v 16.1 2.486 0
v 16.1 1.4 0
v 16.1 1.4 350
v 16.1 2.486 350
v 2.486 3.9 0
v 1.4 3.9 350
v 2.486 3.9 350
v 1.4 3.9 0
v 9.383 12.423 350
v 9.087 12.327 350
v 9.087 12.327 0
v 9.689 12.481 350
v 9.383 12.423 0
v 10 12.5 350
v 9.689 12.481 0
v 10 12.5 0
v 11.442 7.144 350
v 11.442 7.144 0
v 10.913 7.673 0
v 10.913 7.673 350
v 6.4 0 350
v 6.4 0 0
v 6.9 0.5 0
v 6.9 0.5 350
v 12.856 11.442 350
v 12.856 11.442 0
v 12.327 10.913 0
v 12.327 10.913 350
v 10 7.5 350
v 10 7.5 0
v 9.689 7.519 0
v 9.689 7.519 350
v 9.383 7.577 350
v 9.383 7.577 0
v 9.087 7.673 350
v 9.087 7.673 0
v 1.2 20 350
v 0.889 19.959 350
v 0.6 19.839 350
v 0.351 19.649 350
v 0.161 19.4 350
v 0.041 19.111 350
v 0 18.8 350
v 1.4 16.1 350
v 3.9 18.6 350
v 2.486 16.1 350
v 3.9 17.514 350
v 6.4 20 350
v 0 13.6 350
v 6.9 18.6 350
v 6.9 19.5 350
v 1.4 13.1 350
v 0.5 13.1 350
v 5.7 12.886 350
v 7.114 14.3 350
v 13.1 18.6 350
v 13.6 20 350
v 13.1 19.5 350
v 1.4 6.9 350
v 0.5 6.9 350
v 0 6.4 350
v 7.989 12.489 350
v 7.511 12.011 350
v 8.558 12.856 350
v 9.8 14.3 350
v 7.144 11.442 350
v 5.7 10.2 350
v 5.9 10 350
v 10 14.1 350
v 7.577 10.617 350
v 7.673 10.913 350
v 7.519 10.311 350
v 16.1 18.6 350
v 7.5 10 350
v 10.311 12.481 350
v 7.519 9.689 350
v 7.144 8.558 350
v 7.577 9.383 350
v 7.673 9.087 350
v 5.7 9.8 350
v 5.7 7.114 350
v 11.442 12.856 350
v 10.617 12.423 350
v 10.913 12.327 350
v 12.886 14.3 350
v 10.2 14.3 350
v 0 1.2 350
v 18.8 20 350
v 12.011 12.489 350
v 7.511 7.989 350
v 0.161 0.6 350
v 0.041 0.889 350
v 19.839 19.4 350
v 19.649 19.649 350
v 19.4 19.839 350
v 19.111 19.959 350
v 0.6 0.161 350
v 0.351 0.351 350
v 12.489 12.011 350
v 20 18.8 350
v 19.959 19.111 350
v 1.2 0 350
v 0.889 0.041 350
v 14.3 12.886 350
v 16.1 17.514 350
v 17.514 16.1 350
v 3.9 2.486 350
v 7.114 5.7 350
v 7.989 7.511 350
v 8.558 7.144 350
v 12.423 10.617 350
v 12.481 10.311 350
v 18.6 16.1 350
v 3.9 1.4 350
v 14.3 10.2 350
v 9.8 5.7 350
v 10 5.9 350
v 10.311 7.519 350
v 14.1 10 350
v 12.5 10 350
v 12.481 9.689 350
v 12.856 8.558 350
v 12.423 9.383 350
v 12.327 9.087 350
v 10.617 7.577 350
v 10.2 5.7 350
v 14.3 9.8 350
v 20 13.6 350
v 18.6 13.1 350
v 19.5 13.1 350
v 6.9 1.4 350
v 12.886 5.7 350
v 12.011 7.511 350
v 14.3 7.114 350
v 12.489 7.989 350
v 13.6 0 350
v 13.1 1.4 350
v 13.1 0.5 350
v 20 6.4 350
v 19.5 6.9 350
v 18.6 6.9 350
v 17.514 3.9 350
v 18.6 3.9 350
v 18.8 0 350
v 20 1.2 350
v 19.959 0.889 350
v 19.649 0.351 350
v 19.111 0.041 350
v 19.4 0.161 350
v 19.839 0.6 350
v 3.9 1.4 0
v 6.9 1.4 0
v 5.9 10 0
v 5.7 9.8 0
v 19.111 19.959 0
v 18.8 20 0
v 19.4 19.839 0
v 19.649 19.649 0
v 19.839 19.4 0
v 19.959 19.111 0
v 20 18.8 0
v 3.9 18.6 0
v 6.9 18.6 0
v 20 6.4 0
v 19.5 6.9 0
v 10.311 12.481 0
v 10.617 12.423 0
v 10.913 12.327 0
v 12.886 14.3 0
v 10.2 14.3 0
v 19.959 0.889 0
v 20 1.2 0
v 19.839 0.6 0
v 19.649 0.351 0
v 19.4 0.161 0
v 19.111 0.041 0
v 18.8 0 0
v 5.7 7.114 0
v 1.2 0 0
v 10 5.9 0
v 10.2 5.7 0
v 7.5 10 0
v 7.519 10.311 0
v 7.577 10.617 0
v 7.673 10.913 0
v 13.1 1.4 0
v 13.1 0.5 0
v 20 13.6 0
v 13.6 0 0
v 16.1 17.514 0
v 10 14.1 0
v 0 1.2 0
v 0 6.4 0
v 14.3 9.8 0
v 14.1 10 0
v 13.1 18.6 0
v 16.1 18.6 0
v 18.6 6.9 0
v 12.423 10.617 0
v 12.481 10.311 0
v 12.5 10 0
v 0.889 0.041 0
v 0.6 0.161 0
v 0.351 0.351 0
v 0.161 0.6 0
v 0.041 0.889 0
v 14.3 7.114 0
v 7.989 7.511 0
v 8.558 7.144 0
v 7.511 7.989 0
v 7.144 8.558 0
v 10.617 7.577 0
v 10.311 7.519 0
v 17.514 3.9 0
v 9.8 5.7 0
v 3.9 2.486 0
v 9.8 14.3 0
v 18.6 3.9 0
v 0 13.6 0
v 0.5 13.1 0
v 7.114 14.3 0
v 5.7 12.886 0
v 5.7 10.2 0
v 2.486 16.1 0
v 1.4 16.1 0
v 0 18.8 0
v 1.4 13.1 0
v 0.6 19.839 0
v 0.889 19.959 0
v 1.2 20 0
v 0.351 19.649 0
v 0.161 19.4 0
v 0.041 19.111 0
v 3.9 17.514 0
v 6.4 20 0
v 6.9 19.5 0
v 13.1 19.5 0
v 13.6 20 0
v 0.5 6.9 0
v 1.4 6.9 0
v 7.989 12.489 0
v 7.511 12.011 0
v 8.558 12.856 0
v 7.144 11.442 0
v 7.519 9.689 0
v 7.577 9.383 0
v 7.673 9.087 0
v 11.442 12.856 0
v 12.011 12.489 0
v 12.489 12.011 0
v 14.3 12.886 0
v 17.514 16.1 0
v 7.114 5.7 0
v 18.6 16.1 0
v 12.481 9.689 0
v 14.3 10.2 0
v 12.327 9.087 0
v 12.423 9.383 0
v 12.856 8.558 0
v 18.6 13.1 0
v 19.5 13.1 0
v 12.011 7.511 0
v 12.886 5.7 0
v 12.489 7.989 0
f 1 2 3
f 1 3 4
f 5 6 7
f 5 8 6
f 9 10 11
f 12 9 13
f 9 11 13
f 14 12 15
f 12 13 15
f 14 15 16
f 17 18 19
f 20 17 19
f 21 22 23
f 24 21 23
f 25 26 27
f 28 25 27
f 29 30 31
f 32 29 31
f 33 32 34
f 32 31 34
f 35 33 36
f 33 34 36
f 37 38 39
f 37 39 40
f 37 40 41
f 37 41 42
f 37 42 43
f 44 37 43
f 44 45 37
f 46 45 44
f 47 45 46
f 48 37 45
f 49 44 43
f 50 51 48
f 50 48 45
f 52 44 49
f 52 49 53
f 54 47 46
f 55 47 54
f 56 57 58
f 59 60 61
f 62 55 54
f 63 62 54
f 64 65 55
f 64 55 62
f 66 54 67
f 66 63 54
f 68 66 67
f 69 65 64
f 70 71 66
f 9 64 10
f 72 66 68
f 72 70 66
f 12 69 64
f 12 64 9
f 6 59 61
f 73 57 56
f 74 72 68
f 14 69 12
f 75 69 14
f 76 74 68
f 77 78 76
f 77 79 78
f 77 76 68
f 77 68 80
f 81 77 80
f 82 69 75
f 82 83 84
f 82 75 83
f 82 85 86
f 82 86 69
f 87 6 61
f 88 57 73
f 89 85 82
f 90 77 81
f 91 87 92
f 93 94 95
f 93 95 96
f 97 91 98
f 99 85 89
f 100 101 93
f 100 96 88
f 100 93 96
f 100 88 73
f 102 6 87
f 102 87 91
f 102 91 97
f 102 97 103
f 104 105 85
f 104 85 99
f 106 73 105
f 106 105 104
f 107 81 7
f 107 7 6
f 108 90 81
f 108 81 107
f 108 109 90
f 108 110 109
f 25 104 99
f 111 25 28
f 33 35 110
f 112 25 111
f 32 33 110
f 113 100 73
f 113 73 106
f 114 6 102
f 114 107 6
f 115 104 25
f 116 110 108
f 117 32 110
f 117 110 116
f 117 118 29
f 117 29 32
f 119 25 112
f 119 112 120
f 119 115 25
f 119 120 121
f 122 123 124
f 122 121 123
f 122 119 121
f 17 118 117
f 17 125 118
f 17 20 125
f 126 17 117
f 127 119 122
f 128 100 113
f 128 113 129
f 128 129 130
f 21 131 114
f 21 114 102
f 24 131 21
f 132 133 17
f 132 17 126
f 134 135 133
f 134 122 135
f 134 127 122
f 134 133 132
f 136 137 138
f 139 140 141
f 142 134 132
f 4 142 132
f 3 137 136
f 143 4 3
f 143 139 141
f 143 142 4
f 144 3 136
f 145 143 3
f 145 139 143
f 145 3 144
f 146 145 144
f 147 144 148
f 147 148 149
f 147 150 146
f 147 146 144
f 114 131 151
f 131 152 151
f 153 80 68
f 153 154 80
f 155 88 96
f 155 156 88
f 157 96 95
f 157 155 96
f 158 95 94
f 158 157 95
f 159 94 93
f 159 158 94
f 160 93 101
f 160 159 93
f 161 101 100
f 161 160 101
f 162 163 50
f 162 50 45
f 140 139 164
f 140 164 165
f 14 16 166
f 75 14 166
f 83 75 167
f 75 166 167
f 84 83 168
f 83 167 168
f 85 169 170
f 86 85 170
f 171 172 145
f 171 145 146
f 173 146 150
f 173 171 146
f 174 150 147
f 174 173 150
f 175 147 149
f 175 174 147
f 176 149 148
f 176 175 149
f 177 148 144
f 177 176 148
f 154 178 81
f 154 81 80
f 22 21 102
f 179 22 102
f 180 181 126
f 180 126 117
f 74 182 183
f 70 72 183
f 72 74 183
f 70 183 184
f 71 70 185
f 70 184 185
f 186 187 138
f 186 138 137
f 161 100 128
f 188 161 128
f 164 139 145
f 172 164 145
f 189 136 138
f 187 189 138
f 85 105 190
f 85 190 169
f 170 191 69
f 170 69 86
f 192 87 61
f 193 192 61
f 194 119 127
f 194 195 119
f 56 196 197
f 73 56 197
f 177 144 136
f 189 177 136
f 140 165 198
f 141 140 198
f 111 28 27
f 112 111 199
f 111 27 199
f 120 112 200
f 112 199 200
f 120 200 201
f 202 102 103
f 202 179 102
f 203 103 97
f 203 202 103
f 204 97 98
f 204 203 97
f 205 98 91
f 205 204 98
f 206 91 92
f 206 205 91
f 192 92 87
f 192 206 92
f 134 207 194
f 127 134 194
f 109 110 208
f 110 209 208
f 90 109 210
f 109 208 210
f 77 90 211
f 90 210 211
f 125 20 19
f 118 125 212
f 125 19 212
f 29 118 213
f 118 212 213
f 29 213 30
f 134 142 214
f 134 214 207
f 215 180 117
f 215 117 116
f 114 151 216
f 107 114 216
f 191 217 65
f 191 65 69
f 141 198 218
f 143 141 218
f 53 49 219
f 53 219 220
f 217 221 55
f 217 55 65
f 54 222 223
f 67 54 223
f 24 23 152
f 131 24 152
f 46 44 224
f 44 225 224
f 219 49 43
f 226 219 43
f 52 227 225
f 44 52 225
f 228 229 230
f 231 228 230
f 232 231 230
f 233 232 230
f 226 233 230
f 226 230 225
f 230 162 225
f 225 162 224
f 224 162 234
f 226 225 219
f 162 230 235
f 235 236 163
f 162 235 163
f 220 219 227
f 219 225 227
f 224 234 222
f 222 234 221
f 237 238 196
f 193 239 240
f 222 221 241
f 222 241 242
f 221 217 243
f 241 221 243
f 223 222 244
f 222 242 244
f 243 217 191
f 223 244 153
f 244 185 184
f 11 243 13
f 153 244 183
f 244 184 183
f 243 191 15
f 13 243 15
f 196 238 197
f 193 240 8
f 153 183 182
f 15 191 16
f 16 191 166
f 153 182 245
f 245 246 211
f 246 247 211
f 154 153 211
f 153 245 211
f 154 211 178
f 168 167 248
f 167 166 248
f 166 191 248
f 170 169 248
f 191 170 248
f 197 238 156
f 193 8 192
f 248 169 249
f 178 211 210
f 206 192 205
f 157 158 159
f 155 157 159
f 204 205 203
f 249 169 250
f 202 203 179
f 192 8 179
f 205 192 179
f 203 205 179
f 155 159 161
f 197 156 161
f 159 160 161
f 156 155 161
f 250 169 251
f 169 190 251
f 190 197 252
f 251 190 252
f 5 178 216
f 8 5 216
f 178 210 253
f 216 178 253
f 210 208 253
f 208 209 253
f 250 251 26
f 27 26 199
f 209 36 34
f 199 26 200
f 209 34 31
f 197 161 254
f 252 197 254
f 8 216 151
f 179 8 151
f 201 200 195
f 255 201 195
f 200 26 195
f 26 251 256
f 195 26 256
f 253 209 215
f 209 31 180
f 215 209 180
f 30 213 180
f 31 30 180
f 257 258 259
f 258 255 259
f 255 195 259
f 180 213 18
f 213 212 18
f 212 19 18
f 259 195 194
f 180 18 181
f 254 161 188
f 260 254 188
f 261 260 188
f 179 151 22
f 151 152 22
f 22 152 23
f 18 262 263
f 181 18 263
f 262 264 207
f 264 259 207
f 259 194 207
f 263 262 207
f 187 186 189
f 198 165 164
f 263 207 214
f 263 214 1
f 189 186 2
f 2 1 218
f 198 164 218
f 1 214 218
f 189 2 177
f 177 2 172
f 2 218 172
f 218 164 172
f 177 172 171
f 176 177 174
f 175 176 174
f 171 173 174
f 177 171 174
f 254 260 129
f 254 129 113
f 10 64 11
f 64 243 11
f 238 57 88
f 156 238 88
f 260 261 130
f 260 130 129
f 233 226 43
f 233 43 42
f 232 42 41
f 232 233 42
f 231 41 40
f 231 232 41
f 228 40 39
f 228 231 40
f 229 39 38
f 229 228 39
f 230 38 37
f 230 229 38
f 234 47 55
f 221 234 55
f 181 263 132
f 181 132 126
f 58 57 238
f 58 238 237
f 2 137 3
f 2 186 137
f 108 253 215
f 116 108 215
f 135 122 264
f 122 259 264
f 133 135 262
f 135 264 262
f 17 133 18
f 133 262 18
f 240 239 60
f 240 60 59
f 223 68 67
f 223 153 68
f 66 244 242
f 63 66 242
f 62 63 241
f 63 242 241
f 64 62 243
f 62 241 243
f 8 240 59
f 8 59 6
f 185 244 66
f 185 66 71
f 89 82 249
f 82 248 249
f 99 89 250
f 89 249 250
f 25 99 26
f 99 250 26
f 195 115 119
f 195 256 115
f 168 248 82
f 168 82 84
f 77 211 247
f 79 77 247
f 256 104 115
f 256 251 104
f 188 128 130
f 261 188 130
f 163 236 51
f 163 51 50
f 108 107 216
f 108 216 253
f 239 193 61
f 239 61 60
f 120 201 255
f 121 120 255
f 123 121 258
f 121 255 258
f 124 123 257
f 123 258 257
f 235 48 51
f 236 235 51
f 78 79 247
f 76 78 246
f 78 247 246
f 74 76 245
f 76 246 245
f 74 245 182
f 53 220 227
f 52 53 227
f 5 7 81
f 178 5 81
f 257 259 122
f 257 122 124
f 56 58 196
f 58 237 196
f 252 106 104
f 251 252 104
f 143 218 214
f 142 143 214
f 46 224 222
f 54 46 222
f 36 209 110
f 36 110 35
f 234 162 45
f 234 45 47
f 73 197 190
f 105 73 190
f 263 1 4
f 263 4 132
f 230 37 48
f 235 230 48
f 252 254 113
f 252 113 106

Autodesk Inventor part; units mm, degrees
ref_plane "YZ Plane" through (0, 0, 0) normal (1, 0, 0) x (0, 1, 0)
ref_plane "XZ Plane" through (0, 0, 0) normal (0, 1, 0) x (-1, 0, 0)
ref_plane "XY Plane" through (0, 0, 0) normal (0, 0, 1) x (1, 0, 0)
sketch "Sketch1" plane through (0, 0, 0) normal (0, 0, 1) x (1, 0, 0)
  line L0 (6.4, 0) -> (1.2, 0)
  line L1 (0, 1.2) -> (0, 6.4)
  line L2 (0.5, 6.9) -> (1.4, 6.9)
  line L3 (1.4, 6.9) -> (1.4, 3.9)
  line L4 (2.4858, 3.9) -> (5.7, 7.1142)
  line L5 (5.7, 7.1142) -> (5.7, 9.8)
  line L6 (3.9, 2.4858) -> (7.1142, 5.7)
  line L7 (7.1142, 5.7) -> (9.8, 5.7)
  line L8 (7.1435, 8.5577) -> (7.6727, 9.0869)
  line L9 (8.5577, 7.1435) -> (9.0869, 7.6727)
  line L10 (6.9, 0.5) -> (6.9, 1.4)
  line L11 (6.9, 1.4) -> (3.9, 1.4)
  line L12 (5.9, 10) -> (24.7723, 10) construction
  line L13 (10, 21.5486) -> (10, 5.9) construction
  line L14 (1.4, 3.9) -> (2.4858, 3.9)
  line L15 (3.9, 1.4) -> (3.9, 2.4858)
  arc A0 (7.5, 10) -> (7.6727, 9.0869) centre (10, 10) ccw
  arc A1 (9.0869, 7.6727) -> (10, 7.5) centre (10, 10) ccw
  line L16 (14.358, 14.358) -> (-3.5262, -3.5262) construction
  arc A2 (7.1435, 8.5577) -> (8.5577, 7.1435) centre (10, 10) ccw
  line L17 (7.5, 10) -> (5.9, 10)
  line L18 (10, 7.5) -> (10, 5.9)
  arc A3 (0, 1.2) -> (1.2, 0) centre (1.2, 1.2) ccw
  line L19 (0, 6.4) -> (0.5, 6.9)
  line L20 (6.4, 0) -> (6.9, 0.5)
  line L21 (5.7, 9.8) -> (5.9, 10)
  line L22 (10, 5.9) -> (9.8, 5.7)
  point P0 (0, 0)
  point P1 (6.9, 0)
  point P2 (0, 6.9)
  point P3 (5.7, 10)
  point P4 (10, 5.7)
  dimension "d0" = 10
  dimension "d1" = 10
  dimension "d3" = 1.4
  dimension "d4" = 6.1
  dimension "d5" = 6.1
  dimension "d6" = 3.1
  dimension "d7" = 3.1
  dimension "d9" = 5.7
  dimension "d10" = 5.7
  dimension "d12" = 2
  dimension "d14" = 2.5
  dimension "d15" = 3.2
  dimension "d21" = 1.2
  dimension "d22" = 0.5
  dimension "d23" = 0.5
  dimension "d24" = 0.5
  dimension "d25" = 0.5
  dimension "d26" = 0.2
  dimension "d27" = 0.2
  dimension "d28" = 0.2
  dimension "d29" = 0.2
extrude "Extrusion2" add sketch "Sketch1" along normal blind 350
pattern_circular "Circular Pattern2" count 4 over 360 about axis through (10, 10, 350) along (0, 0, 1) of "Extrusion2"
equation "\"d5\" = d4"
equation "\"d7\" = d6"
equation "\"d10\" = d9"
equation "\"d23\" = d22"
equation "\"d24\" = d22"
equation "\"d25\" = d24"
equation "\"d27\" = d26"
equation "\"d28\" = d26"
equation "\"d29\" = d28"
properties part number "profile350mm"
